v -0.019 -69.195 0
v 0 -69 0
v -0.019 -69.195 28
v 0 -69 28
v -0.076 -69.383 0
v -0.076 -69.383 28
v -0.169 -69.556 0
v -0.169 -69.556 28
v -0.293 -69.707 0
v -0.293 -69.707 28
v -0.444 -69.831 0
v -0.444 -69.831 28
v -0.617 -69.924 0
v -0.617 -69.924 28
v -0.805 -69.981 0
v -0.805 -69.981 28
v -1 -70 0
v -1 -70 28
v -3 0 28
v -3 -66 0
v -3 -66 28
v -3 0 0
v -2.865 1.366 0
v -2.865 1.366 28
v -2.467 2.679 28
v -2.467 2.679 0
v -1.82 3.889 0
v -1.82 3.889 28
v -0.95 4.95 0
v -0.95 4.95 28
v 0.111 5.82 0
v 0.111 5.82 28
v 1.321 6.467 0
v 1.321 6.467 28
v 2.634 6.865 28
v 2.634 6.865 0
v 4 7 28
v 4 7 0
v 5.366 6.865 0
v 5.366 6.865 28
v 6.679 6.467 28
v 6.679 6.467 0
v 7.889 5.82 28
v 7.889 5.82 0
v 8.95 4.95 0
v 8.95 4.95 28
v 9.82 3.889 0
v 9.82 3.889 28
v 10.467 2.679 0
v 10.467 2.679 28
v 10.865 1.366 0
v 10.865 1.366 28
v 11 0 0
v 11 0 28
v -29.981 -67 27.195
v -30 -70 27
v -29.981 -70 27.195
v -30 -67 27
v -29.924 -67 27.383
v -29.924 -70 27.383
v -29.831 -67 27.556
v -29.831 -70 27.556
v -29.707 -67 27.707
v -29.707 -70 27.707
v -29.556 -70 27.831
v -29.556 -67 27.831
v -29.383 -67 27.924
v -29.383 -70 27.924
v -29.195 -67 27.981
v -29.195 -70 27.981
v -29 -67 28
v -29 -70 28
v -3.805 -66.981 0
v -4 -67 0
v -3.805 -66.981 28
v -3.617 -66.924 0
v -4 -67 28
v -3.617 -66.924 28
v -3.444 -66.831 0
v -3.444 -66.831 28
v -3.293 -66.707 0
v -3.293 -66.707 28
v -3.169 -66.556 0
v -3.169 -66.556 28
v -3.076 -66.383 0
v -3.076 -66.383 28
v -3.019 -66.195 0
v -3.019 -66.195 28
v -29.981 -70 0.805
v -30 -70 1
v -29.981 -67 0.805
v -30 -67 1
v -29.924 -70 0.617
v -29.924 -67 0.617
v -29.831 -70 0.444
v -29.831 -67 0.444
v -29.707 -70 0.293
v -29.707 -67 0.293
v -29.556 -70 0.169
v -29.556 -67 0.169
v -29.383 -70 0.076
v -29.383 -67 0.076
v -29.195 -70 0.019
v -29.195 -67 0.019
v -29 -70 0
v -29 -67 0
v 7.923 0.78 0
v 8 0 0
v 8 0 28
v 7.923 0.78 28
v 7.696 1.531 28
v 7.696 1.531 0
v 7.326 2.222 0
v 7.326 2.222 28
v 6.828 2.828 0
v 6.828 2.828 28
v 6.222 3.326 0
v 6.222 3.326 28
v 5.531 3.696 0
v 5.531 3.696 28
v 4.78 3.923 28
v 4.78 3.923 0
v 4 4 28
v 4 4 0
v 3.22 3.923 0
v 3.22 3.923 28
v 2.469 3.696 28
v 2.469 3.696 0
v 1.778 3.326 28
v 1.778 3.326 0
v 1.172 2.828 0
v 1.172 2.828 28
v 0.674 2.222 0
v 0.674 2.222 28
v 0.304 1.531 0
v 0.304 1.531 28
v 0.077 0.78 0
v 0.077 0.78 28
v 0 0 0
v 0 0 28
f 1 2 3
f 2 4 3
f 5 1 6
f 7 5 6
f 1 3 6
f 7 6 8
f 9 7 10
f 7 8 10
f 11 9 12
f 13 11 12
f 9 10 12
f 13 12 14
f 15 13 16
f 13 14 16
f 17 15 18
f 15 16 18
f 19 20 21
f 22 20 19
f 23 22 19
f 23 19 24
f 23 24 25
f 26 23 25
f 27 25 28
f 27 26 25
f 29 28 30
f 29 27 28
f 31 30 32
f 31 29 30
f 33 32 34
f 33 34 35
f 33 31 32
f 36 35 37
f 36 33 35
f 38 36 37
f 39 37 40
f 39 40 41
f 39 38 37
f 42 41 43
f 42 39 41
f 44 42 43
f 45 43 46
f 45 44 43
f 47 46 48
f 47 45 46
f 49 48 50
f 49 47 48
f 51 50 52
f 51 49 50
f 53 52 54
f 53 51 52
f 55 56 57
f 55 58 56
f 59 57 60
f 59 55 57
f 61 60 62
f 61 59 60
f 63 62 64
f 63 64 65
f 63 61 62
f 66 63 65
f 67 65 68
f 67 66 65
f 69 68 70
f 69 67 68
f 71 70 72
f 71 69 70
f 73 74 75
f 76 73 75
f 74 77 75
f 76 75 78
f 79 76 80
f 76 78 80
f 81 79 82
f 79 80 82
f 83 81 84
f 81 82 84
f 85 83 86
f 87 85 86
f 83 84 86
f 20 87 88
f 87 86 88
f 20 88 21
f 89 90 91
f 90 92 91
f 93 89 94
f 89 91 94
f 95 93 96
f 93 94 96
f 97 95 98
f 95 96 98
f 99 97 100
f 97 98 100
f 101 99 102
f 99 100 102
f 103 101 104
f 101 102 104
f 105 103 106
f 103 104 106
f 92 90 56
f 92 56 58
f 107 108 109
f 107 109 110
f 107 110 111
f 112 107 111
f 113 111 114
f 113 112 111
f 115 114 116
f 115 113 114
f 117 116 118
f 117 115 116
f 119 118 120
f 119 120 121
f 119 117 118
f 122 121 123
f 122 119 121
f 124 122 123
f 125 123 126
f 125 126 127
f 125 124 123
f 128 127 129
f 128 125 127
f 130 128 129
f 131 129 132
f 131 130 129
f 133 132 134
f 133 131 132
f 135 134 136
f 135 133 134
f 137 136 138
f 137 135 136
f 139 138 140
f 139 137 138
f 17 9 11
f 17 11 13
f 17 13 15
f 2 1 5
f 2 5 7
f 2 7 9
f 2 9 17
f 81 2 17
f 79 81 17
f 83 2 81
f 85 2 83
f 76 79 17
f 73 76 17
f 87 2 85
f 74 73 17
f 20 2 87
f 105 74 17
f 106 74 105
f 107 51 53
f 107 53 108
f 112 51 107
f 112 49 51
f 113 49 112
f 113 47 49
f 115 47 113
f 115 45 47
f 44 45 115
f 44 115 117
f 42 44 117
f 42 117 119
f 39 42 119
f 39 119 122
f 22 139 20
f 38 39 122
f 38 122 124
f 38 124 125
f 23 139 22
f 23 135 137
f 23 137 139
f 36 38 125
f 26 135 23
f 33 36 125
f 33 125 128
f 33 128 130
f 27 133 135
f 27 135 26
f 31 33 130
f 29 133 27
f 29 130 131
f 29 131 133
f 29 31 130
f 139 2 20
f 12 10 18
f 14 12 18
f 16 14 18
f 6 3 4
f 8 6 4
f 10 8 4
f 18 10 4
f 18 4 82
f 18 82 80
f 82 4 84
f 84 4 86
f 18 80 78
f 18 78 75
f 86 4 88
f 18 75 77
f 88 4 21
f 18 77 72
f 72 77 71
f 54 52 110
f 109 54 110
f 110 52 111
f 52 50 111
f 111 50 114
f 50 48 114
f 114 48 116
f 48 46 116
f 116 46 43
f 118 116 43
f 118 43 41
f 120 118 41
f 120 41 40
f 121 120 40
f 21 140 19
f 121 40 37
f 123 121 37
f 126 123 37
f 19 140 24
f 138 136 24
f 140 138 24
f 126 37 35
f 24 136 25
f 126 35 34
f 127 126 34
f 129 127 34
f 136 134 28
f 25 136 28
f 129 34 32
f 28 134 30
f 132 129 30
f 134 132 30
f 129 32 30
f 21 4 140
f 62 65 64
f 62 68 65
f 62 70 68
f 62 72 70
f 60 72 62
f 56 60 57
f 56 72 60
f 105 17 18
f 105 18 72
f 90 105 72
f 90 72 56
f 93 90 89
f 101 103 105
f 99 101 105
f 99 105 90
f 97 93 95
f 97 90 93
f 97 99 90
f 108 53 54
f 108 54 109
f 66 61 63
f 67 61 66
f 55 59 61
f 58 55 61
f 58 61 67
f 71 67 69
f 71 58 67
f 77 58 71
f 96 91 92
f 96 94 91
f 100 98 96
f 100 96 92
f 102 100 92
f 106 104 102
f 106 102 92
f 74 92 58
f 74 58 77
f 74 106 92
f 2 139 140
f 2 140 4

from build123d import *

# Parameters (mm, degrees)
BOSS_EXTRUDE1_DEPTH = 28
FILLET1_R           = 1


with BuildPart() as part:
    # Sketch1 → Boss-Extrude1 (new body)
    with BuildSketch(Plane.XY):
        with BuildLine():
            Line((0, 0), (0, -70))
            Line((0, -70), (-30, -70))
            Line((-30, -70), (-30, -67))
            Line((-30, -67), (-3, -67))
            Line((-3, -67), (-3, 0))
            ThreePointArc((-3, 0), (4, 7), (11, 0))
            Line((11, 0), (8, 0))
            ThreePointArc((8, 0), (4, 4), (0, 0))
        make_face()
    extrude(amount=BOSS_EXTRUDE1_DEPTH)

    # Fillet1
    fillet1_edges = [part.edges().sort_by_distance(p)[0] for p in [
        (0, -70, 14),
        (-3, -67, 14),
        (-30, -68.5, 28),
        (-30, -68.5, 0),
    ]]
    fillet(fillet1_edges, radius=FILLET1_R)


solid = part.part
